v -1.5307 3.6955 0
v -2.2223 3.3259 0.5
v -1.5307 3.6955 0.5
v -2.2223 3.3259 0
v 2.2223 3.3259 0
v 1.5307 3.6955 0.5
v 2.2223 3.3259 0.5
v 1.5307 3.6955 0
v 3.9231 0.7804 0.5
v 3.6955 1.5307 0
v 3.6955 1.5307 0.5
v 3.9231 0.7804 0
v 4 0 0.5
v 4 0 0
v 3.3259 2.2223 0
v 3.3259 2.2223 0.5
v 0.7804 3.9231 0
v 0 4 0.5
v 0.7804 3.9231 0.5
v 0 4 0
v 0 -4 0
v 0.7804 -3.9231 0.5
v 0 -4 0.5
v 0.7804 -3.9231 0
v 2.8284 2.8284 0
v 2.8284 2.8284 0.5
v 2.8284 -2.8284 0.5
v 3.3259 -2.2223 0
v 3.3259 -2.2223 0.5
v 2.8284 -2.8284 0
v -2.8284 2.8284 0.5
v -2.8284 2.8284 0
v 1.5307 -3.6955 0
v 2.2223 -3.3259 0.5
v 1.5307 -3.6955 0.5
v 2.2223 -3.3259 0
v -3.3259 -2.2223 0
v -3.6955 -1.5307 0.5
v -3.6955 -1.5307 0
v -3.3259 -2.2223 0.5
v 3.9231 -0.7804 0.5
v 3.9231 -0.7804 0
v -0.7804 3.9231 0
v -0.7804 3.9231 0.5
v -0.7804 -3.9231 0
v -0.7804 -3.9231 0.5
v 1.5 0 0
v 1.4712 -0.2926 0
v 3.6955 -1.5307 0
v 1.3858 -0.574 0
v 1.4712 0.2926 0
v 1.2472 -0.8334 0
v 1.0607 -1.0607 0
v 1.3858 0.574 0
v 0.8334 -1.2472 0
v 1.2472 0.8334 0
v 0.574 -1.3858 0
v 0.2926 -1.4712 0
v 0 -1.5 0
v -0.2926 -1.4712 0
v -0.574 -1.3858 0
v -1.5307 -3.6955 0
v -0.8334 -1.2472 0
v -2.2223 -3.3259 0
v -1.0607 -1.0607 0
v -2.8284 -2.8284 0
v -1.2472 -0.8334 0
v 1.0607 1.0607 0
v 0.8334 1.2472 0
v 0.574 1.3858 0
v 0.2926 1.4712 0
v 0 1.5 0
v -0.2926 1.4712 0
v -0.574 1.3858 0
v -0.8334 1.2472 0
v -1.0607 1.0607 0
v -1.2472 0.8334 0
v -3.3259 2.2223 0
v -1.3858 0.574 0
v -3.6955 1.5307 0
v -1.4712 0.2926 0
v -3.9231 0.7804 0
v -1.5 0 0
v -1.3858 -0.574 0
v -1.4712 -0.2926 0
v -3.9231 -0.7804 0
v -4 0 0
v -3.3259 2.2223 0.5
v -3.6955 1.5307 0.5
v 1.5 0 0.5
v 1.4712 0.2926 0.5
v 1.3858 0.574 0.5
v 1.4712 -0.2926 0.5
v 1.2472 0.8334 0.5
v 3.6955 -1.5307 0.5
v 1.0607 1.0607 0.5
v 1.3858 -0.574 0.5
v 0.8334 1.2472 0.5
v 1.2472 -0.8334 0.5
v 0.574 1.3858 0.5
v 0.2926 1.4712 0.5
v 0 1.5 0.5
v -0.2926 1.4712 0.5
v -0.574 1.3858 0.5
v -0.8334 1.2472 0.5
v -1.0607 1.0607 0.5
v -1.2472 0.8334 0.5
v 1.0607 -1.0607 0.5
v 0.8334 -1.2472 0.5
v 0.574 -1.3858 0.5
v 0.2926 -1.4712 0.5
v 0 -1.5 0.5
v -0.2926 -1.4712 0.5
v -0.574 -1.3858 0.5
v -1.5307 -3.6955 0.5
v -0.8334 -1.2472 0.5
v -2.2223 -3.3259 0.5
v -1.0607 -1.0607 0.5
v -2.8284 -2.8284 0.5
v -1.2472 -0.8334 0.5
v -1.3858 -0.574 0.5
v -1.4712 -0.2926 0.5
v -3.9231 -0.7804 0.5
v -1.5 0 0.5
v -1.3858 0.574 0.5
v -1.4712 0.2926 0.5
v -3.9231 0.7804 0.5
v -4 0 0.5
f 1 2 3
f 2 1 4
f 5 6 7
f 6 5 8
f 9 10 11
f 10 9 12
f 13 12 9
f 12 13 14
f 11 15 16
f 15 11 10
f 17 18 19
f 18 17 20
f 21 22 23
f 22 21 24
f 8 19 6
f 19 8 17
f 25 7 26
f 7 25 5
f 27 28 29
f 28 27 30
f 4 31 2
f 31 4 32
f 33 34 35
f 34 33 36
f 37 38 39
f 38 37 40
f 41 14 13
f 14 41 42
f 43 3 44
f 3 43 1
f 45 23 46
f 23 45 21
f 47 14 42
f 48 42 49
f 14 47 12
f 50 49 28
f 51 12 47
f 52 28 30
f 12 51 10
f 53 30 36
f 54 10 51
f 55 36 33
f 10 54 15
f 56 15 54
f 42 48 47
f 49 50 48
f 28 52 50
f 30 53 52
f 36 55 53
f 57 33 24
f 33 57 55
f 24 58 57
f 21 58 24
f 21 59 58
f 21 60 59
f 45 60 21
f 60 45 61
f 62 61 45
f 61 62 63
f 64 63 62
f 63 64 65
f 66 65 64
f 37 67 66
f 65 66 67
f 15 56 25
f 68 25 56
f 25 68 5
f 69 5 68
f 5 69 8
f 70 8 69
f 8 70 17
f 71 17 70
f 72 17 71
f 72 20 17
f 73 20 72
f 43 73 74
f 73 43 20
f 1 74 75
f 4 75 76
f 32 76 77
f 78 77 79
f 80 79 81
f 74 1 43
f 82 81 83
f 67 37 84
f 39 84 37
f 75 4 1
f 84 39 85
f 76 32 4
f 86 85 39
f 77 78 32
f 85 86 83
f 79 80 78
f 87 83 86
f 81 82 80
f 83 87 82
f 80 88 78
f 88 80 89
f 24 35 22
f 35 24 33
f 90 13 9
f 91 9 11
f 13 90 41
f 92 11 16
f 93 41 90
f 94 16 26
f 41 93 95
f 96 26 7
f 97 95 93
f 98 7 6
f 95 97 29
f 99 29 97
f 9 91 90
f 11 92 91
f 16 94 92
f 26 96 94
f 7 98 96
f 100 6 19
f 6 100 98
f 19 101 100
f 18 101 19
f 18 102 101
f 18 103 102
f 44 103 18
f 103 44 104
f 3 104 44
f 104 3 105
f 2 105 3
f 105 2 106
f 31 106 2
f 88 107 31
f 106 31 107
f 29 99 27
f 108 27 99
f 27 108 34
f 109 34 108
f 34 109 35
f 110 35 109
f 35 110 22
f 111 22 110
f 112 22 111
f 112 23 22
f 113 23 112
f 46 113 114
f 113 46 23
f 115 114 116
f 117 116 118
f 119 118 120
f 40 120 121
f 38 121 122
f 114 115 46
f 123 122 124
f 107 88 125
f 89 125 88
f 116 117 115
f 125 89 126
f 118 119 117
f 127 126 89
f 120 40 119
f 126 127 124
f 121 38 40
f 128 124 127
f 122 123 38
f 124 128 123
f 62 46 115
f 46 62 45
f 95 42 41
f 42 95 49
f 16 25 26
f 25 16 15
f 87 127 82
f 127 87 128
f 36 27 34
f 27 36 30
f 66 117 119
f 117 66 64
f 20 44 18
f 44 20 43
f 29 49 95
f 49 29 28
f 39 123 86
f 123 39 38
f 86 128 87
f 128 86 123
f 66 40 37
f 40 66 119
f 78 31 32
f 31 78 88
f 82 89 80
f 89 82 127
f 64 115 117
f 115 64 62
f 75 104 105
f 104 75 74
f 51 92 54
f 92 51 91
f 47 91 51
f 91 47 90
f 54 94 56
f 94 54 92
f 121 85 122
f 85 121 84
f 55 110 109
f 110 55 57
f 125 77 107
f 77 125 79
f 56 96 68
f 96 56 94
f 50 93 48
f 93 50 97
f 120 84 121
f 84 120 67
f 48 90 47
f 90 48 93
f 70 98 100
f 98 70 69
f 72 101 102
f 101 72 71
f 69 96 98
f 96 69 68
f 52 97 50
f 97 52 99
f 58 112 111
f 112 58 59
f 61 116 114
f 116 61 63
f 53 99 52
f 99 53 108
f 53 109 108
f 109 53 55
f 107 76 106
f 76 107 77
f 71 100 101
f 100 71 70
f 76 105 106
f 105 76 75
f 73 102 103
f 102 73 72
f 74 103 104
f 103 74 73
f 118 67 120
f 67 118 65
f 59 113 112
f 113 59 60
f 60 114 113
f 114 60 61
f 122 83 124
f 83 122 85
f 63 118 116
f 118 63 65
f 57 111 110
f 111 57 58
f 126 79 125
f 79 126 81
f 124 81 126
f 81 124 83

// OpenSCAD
$fn = 32;
// Precision shim ring.

eps = 0.02;
inner_d = 3;
outer_d = 8;
thickness = 0.5;
difference() {
    cylinder(d = outer_d, h = thickness);
    translate([0, 0, -eps]) cylinder(d = inner_d, h = thickness + 2 * eps);
}
